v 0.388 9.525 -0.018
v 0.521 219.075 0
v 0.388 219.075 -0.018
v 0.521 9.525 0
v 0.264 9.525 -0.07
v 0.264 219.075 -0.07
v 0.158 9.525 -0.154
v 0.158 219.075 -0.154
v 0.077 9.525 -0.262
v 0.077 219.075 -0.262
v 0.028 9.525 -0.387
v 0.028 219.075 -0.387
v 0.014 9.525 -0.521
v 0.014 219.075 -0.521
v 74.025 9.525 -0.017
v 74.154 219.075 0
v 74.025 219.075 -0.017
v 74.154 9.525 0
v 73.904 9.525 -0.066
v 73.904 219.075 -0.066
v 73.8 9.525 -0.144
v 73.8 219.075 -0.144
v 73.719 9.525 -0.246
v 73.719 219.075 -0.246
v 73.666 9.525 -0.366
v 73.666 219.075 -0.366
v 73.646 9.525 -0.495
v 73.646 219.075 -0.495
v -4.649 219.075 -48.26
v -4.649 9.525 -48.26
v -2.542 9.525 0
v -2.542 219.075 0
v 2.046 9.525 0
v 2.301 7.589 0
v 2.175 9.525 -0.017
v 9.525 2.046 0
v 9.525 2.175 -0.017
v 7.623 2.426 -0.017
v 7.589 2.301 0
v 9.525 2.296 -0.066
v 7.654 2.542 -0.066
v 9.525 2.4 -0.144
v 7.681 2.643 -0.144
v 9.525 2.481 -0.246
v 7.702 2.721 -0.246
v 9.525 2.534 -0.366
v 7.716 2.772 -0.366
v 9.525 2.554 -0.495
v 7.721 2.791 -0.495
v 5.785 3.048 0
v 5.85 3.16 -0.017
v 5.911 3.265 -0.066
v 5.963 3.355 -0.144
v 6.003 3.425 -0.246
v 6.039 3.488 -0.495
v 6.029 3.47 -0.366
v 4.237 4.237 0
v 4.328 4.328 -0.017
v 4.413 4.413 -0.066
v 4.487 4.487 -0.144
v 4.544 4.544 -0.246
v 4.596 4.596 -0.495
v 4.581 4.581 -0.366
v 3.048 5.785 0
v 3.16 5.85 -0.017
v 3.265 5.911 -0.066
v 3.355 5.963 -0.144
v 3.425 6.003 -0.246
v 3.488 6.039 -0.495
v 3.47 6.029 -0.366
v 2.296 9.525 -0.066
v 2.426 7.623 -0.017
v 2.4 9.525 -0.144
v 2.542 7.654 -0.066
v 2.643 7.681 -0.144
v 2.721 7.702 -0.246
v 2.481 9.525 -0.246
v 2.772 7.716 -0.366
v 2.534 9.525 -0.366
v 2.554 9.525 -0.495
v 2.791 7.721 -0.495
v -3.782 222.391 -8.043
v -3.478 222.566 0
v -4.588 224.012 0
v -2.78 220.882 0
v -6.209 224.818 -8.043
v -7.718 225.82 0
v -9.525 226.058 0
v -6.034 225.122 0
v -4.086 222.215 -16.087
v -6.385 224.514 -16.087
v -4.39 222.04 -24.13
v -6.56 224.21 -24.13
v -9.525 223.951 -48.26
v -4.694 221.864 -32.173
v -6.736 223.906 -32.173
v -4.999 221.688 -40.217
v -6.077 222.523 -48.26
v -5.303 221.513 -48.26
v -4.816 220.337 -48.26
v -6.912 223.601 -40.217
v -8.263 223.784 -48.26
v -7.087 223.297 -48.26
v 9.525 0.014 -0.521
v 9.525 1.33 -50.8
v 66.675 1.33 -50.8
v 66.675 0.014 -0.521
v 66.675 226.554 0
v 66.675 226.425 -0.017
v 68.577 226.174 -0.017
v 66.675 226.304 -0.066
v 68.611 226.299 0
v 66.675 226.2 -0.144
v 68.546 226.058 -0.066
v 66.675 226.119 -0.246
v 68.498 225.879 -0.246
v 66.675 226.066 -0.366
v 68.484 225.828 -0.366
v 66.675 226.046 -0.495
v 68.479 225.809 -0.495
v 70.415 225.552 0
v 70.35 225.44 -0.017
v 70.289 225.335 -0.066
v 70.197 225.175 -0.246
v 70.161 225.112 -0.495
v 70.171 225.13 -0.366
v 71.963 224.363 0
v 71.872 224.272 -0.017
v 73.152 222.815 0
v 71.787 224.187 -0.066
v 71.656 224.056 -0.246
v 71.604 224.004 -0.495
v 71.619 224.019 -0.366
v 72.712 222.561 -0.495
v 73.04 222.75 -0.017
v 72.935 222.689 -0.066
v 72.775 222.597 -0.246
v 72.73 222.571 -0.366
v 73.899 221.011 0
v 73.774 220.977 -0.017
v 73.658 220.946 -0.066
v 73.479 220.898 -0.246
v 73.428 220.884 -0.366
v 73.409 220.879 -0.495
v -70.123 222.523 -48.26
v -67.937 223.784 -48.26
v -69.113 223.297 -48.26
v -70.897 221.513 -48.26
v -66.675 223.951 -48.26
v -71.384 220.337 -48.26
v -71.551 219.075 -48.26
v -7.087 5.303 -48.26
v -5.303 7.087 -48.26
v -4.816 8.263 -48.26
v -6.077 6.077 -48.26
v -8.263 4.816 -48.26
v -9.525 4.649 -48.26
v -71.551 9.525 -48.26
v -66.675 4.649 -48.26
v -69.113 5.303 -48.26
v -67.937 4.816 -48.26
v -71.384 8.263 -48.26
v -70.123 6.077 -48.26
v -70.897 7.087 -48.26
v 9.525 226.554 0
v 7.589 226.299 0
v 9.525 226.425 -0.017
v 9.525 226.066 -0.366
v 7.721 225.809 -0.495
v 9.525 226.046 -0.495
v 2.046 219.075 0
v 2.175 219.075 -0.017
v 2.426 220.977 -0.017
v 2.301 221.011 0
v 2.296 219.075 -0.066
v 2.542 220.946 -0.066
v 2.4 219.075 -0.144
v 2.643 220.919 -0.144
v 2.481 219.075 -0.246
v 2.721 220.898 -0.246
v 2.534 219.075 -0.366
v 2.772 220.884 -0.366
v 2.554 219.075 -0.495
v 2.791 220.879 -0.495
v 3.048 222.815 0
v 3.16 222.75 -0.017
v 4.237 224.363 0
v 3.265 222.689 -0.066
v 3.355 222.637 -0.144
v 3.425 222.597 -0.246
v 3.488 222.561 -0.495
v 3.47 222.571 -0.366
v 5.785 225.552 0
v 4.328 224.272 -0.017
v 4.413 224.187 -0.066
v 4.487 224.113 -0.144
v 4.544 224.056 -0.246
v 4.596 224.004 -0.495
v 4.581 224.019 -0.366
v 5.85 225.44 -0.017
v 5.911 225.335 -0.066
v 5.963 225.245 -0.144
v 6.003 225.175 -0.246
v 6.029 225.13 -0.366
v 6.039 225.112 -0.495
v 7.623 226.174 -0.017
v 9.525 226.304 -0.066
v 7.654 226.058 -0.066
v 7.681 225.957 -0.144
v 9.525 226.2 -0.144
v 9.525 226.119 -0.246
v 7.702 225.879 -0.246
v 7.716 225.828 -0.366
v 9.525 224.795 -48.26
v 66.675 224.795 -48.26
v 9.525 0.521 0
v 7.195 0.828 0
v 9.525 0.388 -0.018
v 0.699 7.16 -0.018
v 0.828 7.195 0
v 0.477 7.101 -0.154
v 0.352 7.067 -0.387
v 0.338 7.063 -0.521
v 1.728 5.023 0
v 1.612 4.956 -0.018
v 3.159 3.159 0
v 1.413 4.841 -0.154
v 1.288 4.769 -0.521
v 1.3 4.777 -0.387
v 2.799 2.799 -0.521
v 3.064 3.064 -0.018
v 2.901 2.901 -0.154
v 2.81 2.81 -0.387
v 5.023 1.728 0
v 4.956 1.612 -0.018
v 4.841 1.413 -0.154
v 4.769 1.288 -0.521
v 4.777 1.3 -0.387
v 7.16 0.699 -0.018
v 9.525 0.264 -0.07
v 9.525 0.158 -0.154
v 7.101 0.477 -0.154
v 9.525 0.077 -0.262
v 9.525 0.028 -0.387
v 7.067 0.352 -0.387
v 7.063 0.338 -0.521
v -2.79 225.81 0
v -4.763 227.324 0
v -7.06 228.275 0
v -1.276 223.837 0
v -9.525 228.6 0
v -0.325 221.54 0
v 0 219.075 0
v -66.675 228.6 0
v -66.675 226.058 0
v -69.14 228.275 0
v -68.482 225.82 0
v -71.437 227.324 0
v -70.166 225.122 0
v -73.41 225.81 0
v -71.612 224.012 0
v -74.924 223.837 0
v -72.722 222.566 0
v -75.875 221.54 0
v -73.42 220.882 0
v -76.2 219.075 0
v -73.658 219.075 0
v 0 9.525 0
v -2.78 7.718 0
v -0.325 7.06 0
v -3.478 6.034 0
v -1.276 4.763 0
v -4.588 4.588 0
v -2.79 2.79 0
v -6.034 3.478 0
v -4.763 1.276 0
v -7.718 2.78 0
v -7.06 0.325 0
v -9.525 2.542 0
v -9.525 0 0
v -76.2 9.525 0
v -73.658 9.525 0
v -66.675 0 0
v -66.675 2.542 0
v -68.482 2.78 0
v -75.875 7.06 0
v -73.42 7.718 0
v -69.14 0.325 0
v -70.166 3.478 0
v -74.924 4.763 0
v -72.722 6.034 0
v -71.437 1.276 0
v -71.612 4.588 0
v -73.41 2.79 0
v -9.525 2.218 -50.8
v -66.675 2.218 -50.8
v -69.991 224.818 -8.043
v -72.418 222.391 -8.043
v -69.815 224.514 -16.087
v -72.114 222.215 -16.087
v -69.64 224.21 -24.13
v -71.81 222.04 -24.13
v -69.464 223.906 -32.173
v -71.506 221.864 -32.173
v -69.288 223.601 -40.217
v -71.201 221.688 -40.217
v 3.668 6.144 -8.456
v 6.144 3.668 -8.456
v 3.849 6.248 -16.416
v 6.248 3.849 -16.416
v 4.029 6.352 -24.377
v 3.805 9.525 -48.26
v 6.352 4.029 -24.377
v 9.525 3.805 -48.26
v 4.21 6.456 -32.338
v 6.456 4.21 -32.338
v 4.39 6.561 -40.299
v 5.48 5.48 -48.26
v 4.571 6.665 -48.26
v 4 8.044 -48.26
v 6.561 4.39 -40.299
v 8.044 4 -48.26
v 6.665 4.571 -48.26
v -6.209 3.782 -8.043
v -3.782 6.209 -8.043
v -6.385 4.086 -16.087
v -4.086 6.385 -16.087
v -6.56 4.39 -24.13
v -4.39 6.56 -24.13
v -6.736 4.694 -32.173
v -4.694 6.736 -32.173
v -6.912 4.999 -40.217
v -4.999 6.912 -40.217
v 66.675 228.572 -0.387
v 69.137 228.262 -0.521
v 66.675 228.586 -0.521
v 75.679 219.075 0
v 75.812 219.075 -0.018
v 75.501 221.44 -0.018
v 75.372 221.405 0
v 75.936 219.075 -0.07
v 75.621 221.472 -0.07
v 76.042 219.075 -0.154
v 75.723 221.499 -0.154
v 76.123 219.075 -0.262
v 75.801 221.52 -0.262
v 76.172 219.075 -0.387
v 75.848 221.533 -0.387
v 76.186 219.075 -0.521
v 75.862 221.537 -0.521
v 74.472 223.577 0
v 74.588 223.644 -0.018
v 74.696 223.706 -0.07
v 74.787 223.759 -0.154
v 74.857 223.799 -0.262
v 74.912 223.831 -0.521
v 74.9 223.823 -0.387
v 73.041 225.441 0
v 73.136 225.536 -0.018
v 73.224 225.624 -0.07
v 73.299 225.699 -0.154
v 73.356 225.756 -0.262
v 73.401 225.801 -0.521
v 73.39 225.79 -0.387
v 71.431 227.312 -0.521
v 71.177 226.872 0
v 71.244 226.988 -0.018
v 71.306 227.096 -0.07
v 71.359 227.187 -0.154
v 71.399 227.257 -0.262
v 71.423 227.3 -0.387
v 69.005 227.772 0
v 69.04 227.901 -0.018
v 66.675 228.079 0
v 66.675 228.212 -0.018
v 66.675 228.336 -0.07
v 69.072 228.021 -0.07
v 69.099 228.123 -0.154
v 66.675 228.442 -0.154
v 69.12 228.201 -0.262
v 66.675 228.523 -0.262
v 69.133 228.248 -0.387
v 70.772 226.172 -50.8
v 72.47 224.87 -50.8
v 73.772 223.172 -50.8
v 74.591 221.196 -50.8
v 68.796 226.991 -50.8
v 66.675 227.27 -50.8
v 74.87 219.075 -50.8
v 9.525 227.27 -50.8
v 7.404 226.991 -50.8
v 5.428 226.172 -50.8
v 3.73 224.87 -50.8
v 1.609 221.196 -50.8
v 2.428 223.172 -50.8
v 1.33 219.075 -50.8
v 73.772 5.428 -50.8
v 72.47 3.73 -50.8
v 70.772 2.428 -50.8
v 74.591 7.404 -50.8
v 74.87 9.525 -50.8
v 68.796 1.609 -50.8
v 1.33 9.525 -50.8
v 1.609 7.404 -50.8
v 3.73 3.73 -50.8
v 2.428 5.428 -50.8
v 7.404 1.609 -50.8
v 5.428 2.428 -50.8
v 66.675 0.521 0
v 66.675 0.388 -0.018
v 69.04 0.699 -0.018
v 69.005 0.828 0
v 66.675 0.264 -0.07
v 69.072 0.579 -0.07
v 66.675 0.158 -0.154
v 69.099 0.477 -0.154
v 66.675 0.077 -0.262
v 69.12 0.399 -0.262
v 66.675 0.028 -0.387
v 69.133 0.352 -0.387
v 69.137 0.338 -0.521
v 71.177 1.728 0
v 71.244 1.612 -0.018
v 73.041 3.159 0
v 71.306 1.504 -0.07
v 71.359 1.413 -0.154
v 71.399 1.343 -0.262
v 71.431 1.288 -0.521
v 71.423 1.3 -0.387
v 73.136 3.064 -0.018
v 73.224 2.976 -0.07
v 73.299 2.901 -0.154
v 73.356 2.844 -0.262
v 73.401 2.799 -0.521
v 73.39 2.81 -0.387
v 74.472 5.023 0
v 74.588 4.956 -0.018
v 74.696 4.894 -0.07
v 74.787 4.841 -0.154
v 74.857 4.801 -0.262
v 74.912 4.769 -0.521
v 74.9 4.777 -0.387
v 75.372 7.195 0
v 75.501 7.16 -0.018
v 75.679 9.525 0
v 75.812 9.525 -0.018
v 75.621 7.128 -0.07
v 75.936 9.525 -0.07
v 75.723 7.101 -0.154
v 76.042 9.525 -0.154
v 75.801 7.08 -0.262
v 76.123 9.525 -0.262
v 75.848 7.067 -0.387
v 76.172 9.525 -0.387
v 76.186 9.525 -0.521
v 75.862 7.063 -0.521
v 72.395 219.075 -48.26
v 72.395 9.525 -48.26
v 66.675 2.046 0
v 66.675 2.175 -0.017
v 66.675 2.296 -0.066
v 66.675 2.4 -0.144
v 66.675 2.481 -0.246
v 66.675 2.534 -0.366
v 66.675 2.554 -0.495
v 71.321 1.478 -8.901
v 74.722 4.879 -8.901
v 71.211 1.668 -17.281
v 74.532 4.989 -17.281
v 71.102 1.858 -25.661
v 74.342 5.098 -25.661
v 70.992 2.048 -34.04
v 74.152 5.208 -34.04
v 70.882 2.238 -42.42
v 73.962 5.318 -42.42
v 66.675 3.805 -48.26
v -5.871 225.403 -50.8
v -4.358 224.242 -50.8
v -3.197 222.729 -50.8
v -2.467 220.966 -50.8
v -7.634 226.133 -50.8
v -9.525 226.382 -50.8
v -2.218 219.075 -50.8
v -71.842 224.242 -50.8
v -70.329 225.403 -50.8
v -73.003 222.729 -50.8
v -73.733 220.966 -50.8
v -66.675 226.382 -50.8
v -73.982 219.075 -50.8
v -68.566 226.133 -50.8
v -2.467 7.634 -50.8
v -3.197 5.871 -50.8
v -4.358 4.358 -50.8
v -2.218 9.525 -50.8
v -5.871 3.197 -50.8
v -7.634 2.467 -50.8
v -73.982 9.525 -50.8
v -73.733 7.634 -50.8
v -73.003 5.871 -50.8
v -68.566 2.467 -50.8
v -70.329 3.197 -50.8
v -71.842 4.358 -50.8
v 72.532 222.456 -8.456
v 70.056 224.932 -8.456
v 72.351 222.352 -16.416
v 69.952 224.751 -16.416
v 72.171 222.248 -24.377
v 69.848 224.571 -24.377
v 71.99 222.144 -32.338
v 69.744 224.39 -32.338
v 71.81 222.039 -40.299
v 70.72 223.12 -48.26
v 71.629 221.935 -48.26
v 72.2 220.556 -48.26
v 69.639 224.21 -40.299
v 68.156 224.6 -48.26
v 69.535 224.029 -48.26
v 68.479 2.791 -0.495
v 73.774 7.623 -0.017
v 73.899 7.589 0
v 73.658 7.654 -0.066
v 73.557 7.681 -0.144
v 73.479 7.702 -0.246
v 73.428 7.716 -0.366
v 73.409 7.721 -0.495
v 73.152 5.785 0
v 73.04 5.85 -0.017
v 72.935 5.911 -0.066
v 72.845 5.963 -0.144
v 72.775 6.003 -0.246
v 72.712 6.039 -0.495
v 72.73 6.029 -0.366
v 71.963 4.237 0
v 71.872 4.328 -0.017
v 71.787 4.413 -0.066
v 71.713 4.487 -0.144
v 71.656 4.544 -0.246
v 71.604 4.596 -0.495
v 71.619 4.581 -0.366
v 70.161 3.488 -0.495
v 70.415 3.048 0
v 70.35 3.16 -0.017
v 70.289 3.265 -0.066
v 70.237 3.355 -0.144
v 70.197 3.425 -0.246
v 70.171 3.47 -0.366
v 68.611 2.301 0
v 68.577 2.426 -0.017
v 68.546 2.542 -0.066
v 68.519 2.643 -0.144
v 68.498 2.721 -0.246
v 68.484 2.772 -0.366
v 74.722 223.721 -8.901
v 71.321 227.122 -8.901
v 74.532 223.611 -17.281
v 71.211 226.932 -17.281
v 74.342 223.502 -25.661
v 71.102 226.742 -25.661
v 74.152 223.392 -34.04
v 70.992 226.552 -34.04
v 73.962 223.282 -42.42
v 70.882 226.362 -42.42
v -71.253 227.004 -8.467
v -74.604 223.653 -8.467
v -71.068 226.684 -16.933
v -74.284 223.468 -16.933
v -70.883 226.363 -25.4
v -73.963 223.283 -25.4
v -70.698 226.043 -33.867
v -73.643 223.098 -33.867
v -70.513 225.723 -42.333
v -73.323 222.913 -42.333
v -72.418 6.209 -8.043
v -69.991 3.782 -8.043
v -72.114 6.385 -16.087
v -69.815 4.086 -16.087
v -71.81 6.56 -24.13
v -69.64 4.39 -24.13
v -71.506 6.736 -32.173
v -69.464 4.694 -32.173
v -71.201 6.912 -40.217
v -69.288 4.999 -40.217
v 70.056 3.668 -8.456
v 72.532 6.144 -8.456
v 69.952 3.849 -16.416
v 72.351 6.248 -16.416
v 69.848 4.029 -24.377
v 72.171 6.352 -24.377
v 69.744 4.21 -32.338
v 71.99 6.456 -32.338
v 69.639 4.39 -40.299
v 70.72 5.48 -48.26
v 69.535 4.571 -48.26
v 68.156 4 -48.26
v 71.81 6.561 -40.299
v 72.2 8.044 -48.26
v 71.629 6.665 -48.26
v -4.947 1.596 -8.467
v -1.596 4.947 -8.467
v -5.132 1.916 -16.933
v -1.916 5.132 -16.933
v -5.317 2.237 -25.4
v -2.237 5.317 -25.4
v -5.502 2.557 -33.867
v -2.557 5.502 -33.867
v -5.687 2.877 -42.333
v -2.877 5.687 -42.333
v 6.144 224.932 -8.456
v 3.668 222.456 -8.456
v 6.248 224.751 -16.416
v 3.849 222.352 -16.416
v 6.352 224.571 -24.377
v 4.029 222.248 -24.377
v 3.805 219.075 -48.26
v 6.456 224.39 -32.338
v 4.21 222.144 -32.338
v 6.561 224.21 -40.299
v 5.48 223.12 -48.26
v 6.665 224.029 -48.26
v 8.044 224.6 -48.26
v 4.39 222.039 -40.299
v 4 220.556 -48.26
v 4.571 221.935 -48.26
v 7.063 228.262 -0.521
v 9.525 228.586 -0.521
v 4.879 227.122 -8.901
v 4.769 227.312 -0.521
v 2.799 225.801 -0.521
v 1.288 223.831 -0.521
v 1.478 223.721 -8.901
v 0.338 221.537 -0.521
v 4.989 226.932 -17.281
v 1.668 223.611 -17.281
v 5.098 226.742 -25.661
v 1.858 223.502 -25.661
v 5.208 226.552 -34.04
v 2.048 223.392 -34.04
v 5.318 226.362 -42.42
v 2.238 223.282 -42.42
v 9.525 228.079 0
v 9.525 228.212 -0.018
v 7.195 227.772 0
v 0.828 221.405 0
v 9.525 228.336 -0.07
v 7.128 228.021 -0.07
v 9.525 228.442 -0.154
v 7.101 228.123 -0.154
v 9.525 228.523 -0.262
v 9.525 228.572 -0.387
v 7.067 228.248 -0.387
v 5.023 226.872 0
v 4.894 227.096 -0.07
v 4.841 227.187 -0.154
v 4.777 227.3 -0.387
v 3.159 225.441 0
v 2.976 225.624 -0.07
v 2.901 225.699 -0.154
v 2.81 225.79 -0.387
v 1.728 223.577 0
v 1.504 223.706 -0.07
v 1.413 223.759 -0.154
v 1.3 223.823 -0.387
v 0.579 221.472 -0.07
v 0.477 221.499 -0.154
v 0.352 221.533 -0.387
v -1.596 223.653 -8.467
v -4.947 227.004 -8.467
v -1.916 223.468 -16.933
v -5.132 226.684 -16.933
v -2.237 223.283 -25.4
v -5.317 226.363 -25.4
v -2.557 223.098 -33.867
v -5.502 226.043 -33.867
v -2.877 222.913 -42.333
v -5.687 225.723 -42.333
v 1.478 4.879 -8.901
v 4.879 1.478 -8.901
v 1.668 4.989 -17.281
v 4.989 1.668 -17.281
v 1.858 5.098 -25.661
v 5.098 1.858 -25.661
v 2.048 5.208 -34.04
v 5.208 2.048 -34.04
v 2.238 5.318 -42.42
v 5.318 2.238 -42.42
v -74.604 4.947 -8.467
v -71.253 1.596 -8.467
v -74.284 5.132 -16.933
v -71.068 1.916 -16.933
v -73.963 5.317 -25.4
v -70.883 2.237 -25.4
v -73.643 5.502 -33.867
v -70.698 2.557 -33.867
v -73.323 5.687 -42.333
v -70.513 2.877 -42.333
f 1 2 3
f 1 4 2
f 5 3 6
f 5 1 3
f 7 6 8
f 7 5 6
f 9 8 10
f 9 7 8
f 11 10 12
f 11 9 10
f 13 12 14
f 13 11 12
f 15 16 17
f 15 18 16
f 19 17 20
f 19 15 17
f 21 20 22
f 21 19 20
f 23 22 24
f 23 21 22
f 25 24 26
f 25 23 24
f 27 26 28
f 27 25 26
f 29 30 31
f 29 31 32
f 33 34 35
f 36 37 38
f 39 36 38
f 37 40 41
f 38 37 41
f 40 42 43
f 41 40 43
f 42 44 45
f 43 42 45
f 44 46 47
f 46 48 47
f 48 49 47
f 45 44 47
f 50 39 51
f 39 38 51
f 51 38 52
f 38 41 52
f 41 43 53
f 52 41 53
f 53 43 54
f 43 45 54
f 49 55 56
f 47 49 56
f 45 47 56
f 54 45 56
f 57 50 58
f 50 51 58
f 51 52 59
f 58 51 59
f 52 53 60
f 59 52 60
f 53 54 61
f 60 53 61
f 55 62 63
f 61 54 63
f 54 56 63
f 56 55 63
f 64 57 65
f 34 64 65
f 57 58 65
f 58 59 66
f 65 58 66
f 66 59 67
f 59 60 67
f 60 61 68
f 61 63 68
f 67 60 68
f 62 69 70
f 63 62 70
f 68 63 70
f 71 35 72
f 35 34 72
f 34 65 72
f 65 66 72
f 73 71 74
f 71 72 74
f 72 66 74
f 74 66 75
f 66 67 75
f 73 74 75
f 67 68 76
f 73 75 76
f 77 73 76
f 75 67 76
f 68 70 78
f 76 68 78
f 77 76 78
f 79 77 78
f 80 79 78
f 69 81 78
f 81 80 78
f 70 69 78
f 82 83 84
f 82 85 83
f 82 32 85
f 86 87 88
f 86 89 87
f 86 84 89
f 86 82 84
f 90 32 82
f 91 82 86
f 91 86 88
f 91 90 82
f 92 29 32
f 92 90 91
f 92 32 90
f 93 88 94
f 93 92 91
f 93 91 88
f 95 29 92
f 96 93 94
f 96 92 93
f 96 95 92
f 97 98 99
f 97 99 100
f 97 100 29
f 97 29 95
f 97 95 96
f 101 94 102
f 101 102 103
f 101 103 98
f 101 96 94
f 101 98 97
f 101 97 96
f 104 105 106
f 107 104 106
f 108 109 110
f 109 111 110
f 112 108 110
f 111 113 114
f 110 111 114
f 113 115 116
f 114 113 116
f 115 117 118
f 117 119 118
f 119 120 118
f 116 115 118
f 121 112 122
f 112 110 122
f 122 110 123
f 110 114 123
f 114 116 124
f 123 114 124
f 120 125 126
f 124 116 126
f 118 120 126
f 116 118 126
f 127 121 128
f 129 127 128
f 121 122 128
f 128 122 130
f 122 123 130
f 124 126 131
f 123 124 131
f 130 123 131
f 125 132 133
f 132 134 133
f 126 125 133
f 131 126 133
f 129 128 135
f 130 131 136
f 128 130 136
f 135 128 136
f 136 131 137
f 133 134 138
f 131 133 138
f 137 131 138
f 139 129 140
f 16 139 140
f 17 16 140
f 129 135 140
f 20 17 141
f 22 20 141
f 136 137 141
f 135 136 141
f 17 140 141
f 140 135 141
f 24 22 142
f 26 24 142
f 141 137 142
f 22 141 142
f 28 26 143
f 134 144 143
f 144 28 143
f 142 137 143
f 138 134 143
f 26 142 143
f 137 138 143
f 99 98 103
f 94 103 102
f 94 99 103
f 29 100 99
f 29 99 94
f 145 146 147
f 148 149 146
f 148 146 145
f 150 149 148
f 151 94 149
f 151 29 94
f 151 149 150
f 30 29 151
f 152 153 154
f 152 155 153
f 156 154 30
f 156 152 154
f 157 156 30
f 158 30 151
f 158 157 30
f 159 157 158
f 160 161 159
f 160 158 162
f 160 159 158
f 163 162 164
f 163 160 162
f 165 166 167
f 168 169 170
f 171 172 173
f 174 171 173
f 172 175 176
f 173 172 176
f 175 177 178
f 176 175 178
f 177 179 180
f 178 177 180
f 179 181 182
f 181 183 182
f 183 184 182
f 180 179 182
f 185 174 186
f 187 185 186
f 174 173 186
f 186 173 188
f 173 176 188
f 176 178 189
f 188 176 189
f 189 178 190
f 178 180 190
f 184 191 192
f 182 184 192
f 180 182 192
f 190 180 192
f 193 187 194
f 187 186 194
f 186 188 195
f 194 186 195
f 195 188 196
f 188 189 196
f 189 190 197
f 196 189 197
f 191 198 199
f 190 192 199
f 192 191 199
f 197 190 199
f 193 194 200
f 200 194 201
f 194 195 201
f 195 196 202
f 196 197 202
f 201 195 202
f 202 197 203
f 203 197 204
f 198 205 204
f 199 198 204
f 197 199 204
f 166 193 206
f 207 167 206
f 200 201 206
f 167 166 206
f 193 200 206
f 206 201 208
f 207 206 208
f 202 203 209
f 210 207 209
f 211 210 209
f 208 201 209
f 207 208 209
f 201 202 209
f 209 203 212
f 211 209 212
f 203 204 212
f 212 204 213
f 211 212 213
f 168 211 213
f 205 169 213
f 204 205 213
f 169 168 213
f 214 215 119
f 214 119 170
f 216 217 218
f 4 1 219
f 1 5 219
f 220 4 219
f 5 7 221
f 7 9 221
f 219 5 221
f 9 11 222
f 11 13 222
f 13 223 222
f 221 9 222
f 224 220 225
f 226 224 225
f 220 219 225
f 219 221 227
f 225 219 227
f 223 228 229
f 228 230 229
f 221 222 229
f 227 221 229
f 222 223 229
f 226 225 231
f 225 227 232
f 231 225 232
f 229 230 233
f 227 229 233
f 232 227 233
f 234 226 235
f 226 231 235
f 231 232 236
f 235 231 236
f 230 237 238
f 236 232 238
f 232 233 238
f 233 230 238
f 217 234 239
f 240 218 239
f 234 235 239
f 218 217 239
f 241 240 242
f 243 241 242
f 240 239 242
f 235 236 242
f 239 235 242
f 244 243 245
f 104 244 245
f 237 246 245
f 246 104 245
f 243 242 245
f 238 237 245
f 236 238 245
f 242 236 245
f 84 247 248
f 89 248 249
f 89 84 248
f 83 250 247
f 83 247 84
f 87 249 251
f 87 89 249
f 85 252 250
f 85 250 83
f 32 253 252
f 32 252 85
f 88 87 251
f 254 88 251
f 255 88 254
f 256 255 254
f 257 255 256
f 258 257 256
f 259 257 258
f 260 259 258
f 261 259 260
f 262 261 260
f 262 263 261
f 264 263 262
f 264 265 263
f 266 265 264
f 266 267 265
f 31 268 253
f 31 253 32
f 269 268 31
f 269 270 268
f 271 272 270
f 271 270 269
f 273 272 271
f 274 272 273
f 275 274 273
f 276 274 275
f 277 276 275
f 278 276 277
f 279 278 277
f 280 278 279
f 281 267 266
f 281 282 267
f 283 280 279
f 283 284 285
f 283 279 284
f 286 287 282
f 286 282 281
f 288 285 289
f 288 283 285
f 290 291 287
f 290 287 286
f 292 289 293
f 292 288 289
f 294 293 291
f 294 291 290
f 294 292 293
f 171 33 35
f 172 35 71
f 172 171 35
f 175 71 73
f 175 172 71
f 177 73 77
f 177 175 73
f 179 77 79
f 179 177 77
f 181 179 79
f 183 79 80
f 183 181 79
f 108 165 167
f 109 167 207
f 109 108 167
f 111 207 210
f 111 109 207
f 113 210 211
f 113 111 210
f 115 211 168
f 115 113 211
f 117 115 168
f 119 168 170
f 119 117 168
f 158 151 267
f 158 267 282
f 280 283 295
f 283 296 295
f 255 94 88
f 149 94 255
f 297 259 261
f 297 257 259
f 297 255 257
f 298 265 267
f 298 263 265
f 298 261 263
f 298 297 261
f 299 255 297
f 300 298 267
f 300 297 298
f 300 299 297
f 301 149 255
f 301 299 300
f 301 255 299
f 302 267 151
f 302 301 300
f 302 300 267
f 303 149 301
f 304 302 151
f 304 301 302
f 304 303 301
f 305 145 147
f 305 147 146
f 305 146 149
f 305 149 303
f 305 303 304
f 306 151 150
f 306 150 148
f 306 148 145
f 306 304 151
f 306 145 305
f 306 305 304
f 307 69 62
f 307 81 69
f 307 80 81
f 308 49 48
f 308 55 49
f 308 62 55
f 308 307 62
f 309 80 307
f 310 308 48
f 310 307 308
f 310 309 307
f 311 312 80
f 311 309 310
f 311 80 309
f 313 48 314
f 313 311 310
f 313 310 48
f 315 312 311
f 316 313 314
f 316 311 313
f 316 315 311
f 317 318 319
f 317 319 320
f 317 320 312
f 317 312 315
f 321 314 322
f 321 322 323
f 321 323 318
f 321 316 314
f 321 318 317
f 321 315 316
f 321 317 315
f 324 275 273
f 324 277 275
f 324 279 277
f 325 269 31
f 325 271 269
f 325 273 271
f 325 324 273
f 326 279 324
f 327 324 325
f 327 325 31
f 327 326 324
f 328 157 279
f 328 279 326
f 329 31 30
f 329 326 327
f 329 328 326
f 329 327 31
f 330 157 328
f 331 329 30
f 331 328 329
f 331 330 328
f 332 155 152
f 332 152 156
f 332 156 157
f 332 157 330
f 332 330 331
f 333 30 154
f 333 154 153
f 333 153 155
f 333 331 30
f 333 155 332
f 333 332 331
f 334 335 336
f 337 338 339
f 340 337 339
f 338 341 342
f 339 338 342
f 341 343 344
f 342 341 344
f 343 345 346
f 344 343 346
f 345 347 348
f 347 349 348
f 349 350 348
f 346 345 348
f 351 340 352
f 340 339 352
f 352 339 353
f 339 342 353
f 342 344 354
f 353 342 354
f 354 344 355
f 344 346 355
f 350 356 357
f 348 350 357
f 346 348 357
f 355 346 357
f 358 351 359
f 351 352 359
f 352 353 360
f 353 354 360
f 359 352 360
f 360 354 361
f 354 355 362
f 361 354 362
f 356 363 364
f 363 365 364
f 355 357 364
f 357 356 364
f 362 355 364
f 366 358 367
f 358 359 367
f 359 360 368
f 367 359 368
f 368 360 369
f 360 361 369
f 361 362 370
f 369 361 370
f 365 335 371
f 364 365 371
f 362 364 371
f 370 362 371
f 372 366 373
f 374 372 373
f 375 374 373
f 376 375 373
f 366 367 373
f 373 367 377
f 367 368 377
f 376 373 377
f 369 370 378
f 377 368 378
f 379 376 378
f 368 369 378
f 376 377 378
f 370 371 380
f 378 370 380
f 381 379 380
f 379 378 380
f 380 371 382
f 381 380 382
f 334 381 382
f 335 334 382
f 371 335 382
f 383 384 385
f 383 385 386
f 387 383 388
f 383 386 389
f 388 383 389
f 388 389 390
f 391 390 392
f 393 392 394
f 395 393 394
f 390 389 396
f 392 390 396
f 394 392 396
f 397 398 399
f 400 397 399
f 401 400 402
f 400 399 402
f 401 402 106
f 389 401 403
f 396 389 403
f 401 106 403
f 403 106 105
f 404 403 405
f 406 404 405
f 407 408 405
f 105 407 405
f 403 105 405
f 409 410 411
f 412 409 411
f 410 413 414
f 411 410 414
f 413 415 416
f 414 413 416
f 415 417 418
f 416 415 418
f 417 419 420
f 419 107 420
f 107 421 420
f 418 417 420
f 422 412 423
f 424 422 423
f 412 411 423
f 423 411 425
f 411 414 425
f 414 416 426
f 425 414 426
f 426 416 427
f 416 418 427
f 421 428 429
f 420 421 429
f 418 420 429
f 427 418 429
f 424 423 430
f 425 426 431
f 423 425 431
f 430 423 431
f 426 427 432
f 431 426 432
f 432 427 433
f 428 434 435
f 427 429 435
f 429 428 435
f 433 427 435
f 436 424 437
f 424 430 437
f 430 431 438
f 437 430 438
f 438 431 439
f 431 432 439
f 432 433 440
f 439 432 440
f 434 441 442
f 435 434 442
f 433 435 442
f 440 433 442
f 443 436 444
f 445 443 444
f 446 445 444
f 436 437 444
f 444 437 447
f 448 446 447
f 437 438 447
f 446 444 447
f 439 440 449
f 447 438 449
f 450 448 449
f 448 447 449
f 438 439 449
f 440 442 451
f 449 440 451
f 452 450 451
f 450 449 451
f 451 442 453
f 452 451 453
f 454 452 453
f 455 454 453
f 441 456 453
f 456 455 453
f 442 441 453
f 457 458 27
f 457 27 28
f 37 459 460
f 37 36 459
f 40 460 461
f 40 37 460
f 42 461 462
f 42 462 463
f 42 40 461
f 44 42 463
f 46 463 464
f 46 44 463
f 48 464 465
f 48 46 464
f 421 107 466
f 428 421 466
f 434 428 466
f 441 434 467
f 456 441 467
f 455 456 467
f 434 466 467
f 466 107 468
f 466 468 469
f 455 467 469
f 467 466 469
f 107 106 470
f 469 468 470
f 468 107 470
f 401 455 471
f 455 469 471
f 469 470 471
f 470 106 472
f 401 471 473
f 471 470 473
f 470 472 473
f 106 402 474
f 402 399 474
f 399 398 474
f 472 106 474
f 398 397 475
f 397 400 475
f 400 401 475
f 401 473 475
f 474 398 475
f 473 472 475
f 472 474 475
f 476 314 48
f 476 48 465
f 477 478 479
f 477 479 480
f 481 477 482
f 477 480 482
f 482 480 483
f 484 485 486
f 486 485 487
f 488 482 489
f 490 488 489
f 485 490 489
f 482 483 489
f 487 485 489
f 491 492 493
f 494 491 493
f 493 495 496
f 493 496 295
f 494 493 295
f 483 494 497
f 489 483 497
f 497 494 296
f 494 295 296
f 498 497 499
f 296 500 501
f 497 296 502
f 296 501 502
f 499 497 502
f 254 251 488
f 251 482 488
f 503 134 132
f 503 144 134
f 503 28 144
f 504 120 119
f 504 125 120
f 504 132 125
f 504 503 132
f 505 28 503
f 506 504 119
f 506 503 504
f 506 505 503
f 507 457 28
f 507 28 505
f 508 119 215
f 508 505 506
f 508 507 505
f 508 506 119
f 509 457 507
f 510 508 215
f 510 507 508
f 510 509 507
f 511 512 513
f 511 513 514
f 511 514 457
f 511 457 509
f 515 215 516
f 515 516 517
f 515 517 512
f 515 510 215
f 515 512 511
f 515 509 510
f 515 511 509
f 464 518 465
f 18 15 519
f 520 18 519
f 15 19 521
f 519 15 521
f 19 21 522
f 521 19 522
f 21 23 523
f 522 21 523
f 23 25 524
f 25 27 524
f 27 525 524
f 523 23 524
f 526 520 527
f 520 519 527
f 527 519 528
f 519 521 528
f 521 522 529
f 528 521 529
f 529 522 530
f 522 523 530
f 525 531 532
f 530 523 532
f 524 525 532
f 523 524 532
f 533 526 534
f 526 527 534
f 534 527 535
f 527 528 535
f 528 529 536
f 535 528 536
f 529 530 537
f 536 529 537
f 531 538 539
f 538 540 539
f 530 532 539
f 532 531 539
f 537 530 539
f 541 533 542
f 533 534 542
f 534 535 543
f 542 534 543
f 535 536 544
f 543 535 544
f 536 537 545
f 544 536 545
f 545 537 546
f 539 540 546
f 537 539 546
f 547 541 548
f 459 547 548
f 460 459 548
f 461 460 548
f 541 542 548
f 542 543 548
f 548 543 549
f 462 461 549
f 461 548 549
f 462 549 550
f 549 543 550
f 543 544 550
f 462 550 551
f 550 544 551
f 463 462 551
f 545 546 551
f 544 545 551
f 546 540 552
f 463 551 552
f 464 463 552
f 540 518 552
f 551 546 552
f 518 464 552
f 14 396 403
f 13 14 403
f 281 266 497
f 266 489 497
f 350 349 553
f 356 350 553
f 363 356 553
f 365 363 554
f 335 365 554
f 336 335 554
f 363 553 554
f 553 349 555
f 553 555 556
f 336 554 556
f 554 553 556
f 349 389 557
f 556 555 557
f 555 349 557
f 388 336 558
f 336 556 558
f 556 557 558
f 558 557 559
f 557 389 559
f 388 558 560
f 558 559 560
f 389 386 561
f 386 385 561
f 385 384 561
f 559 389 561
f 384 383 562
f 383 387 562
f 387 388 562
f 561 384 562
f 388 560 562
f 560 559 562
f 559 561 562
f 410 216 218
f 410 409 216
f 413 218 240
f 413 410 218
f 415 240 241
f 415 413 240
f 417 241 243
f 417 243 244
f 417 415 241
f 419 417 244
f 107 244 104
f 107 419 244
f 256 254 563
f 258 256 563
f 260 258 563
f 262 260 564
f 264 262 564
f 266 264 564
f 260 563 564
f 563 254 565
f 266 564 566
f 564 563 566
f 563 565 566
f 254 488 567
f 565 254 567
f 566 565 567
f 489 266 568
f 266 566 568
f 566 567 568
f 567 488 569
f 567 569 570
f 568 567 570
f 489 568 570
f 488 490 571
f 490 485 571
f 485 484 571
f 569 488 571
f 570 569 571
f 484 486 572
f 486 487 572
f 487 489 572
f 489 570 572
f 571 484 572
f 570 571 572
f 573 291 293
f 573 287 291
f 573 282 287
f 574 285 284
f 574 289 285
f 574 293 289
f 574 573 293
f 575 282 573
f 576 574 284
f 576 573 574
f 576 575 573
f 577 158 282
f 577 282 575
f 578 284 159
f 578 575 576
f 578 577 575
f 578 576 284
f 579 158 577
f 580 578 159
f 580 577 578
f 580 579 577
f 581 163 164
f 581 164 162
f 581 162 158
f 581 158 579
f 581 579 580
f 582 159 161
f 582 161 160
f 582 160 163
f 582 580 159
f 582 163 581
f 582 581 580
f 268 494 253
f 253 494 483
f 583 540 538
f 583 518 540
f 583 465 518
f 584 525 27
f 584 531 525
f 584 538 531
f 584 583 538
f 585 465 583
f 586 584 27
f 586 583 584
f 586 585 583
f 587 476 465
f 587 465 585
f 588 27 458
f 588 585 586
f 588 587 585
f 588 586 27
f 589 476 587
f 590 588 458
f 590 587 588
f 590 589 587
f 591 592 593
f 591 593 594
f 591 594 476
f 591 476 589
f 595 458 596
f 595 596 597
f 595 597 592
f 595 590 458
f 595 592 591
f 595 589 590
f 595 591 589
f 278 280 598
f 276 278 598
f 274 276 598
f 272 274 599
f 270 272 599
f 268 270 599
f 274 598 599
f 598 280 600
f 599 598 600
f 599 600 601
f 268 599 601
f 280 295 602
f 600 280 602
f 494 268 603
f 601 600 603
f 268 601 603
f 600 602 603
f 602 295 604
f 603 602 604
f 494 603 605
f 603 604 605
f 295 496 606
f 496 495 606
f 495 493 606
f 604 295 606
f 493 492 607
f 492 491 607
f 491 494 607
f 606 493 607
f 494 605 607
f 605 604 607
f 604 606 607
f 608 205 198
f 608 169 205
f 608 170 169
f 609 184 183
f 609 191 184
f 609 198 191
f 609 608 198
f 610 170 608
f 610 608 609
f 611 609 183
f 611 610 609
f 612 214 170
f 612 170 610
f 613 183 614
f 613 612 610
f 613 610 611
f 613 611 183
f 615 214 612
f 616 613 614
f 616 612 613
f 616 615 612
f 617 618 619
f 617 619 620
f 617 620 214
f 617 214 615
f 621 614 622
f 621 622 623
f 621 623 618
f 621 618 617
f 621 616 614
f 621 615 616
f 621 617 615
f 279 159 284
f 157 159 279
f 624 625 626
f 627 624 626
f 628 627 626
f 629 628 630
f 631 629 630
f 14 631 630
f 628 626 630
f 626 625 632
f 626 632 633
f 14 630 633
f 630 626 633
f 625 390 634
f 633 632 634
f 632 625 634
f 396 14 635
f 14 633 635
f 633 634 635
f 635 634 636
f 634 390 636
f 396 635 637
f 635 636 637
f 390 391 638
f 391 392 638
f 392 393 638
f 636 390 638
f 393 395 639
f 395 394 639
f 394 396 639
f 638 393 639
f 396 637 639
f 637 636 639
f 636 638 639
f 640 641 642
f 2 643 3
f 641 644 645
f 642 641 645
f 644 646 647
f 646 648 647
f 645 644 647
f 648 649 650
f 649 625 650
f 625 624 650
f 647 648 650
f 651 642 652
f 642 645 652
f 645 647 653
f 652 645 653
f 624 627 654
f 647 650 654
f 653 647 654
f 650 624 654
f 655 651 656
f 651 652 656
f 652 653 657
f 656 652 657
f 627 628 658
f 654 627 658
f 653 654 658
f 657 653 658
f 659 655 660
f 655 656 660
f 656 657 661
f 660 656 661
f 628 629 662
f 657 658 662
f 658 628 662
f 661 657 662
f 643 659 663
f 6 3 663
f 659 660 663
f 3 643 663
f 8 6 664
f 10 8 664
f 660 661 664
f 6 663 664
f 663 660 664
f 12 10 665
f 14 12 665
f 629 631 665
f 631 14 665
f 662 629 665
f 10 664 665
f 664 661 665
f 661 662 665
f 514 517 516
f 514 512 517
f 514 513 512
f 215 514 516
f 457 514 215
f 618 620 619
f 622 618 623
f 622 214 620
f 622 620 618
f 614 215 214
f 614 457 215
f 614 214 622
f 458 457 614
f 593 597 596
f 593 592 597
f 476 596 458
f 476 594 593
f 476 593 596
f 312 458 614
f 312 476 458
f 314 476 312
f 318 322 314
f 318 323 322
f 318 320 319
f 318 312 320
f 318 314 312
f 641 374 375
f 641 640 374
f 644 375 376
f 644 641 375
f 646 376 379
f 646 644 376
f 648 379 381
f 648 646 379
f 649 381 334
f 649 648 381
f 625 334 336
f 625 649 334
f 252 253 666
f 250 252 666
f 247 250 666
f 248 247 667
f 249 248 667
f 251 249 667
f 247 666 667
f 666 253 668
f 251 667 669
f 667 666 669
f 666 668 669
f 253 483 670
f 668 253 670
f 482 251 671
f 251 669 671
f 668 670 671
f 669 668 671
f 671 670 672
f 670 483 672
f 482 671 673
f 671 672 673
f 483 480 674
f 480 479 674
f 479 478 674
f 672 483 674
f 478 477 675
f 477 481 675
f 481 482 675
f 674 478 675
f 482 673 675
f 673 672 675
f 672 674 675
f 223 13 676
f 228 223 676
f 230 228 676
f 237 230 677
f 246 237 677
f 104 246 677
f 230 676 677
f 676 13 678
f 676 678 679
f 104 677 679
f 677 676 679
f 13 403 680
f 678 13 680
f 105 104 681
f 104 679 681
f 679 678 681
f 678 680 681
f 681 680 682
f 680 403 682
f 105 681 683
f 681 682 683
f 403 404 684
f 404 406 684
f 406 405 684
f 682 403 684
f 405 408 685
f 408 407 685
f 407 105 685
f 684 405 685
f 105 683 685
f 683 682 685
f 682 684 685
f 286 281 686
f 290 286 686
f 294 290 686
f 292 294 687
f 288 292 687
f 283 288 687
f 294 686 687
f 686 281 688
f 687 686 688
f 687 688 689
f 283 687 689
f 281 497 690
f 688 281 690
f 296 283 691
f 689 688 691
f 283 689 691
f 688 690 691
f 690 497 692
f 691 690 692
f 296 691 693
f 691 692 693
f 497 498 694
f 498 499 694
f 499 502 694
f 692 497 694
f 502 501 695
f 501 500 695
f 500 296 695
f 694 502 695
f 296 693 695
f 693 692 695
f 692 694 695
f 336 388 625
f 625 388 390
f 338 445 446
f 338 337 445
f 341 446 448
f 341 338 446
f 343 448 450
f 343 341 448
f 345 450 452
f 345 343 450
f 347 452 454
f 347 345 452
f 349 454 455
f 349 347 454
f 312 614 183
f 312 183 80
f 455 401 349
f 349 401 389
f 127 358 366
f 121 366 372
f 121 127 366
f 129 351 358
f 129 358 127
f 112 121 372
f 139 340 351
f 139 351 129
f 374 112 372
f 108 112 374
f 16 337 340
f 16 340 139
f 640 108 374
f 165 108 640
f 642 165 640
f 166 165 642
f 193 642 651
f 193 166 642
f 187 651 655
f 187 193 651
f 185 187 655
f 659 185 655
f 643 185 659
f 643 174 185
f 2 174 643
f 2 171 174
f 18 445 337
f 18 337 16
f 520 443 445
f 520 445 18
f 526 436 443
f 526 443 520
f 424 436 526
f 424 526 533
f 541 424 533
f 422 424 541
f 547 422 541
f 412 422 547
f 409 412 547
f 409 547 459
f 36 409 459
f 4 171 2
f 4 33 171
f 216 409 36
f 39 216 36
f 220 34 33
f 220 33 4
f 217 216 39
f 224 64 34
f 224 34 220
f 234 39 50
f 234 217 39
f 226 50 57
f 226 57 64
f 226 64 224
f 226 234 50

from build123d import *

# Parameters (mm, degrees)
F1_DEPTH = 50.8
F1_TAPER = 1.5
F2_T     = 2.54
F3_R     = 0.508
F5_DEPTH = 50.8
F5_TAPER = 2.5
F6_T     = 2.54


# Not quite as in the source:
# - a shell that OpenCascade refuses in one call is made with other operations: the cavity is built on its own and cut out


with BuildPart() as f1:
    # F0 (on Top) → F1 (new body)
    with BuildSketch(Plane.XY):
        with BuildLine():
            ThreePointArc((0, 9.525), (2.7898079092, 2.7898079092), (9.525, 0))
            Line((9.525, 0), (66.675, 0))
            ThreePointArc((66.675, 0), (73.4101920908, 2.7898079092), (76.2, 9.525))
            Line((76.2, 9.525), (76.2, 219.075))
            ThreePointArc((76.2, 219.075), (73.4101920908, 225.8101920908), (66.675, 228.6))
            Line((66.675, 228.6), (9.525, 228.6))
            ThreePointArc((9.525, 228.6), (2.7898079092, 225.8101920908), (0, 219.075))
            Line((0, 219.075), (0, 9.525))
        make_face()
    extrude(amount=-F1_DEPTH, taper=F1_TAPER)

    # F2: shell of thickness 2.54, made by hand


with BuildPart() as f2_core1:
    # F2_t2: copy of F1
    add(f1.part)

    # the walls: a layer under each face that stays
    f2_faces = [f2_core1.faces().sort_by_distance(p)[0] for p in [
        (0.6651224079, 114.3, -25.4),
        (3.2601204741, 3.2601204741, -25.4),
        (38.1, 0.6651224079, -25.4),
        (72.9398795259, 3.2601204741, -25.4),
        (75.5348775921, 114.3, -25.4),
        (72.9398795259, 225.3398795259, -25.4),
        (38.1, 227.9348775921, -25.4),
        (3.2601204741, 225.3398795259, -25.4),
        (38.1, 114.3, -50.8),
    ]]
    thicken(f2_faces, amount=-F2_T, mode=Mode.SUBTRACT)


with BuildPart() as f1_1:
    add(f1.part)

    # what is left inside the walls is the cavity
    f2_cavity = [f2_core1.part.solids().sort_by_distance(p)[0] for p in [
        (38.1, 151.553043, -0.0254),
    ]]
    add(f2_cavity, mode=Mode.SUBTRACT)

    # F3
    f3_edges = [f1_1.edges().sort_by_distance(p)[0] for p in [
        (38.1, 0, 0),
        (73.410192, 2.789808, 0),
        (76.2, 114.3, 0),
        (2.789808, 2.789808, 0),
        (0, 114.3, 0),
        (2.789808, 225.810192, 0),
        (38.1, 228.6, 0),
        (73.410192, 225.810192, 0),
        (38.1, 2.540871, 0),
        (73.659129, 114.3, 0),
        (38.1, 226.059129, 0),
        (2.540871, 114.3, 0),
        (71.613525, 4.586475, 0),
        (4.586475, 4.586475, 0),
        (71.613525, 224.013525, 0),
        (4.586475, 224.013525, 0),
    ]]
    fillet(f3_edges, radius=F3_R)


with BuildPart() as f5:
    # F4 (on Top) → F5 (new body)
    with BuildSketch(Plane.XY):
        with BuildLine():
            ThreePointArc((-76.2, 9.525), (-73.4101920908, 2.7898079092), (-66.675, 0))
            Line((-66.675, 0), (-9.525, 0))
            ThreePointArc((-9.525, 0), (-2.7898079092, 2.7898079092), (0, 9.525))
            Line((0, 9.525), (0, 219.075))
            ThreePointArc((0, 219.075), (-2.7898079092, 225.8101920908), (-9.525, 228.6))
            Line((-9.525, 228.6), (-66.675, 228.6))
            ThreePointArc((-66.675, 228.6), (-73.4101920908, 225.8101920908), (-76.2, 219.075))
            Line((-76.2, 219.075), (-76.2, 9.525))
        make_face()
    extrude(amount=-F5_DEPTH, taper=F5_TAPER)

    # F6: shell of thickness 2.54, made by hand


with BuildPart() as f6_core1:
    # F6_t2: copy of F5
    add(f5.part)

    # the walls: a layer under each face that stays
    f6_faces = [f6_core1.faces().sort_by_distance(p)[0] for p in [
        (-75.0910120501, 114.3, -25.4),
        (-72.6260191912, 3.5739808088, -25.4),
        (-38.1, 1.1089879499, -25.4),
        (-3.5739808088, 3.5739808088, -25.4),
        (-1.1089879499, 114.3, -25.4),
        (-3.5739808088, 225.0260191912, -25.4),
        (-38.1, 227.4910120501, -25.4),
        (-72.6260191912, 225.0260191912, -25.4),
        (-38.1, 114.3, -50.8),
    ]]
    thicken(f6_faces, amount=-F6_T, mode=Mode.SUBTRACT)


with BuildPart() as f5_1:
    add(f5.part)

    # what is left inside the walls is the cavity
    f6_cavity = [f6_core1.part.solids().sort_by_distance(p)[0] for p in [
        (-38.1, 151.552527, -0.0254),
    ]]
    add(f6_cavity, mode=Mode.SUBTRACT)


solid = Compound([f1_1.part, f5_1.part])
